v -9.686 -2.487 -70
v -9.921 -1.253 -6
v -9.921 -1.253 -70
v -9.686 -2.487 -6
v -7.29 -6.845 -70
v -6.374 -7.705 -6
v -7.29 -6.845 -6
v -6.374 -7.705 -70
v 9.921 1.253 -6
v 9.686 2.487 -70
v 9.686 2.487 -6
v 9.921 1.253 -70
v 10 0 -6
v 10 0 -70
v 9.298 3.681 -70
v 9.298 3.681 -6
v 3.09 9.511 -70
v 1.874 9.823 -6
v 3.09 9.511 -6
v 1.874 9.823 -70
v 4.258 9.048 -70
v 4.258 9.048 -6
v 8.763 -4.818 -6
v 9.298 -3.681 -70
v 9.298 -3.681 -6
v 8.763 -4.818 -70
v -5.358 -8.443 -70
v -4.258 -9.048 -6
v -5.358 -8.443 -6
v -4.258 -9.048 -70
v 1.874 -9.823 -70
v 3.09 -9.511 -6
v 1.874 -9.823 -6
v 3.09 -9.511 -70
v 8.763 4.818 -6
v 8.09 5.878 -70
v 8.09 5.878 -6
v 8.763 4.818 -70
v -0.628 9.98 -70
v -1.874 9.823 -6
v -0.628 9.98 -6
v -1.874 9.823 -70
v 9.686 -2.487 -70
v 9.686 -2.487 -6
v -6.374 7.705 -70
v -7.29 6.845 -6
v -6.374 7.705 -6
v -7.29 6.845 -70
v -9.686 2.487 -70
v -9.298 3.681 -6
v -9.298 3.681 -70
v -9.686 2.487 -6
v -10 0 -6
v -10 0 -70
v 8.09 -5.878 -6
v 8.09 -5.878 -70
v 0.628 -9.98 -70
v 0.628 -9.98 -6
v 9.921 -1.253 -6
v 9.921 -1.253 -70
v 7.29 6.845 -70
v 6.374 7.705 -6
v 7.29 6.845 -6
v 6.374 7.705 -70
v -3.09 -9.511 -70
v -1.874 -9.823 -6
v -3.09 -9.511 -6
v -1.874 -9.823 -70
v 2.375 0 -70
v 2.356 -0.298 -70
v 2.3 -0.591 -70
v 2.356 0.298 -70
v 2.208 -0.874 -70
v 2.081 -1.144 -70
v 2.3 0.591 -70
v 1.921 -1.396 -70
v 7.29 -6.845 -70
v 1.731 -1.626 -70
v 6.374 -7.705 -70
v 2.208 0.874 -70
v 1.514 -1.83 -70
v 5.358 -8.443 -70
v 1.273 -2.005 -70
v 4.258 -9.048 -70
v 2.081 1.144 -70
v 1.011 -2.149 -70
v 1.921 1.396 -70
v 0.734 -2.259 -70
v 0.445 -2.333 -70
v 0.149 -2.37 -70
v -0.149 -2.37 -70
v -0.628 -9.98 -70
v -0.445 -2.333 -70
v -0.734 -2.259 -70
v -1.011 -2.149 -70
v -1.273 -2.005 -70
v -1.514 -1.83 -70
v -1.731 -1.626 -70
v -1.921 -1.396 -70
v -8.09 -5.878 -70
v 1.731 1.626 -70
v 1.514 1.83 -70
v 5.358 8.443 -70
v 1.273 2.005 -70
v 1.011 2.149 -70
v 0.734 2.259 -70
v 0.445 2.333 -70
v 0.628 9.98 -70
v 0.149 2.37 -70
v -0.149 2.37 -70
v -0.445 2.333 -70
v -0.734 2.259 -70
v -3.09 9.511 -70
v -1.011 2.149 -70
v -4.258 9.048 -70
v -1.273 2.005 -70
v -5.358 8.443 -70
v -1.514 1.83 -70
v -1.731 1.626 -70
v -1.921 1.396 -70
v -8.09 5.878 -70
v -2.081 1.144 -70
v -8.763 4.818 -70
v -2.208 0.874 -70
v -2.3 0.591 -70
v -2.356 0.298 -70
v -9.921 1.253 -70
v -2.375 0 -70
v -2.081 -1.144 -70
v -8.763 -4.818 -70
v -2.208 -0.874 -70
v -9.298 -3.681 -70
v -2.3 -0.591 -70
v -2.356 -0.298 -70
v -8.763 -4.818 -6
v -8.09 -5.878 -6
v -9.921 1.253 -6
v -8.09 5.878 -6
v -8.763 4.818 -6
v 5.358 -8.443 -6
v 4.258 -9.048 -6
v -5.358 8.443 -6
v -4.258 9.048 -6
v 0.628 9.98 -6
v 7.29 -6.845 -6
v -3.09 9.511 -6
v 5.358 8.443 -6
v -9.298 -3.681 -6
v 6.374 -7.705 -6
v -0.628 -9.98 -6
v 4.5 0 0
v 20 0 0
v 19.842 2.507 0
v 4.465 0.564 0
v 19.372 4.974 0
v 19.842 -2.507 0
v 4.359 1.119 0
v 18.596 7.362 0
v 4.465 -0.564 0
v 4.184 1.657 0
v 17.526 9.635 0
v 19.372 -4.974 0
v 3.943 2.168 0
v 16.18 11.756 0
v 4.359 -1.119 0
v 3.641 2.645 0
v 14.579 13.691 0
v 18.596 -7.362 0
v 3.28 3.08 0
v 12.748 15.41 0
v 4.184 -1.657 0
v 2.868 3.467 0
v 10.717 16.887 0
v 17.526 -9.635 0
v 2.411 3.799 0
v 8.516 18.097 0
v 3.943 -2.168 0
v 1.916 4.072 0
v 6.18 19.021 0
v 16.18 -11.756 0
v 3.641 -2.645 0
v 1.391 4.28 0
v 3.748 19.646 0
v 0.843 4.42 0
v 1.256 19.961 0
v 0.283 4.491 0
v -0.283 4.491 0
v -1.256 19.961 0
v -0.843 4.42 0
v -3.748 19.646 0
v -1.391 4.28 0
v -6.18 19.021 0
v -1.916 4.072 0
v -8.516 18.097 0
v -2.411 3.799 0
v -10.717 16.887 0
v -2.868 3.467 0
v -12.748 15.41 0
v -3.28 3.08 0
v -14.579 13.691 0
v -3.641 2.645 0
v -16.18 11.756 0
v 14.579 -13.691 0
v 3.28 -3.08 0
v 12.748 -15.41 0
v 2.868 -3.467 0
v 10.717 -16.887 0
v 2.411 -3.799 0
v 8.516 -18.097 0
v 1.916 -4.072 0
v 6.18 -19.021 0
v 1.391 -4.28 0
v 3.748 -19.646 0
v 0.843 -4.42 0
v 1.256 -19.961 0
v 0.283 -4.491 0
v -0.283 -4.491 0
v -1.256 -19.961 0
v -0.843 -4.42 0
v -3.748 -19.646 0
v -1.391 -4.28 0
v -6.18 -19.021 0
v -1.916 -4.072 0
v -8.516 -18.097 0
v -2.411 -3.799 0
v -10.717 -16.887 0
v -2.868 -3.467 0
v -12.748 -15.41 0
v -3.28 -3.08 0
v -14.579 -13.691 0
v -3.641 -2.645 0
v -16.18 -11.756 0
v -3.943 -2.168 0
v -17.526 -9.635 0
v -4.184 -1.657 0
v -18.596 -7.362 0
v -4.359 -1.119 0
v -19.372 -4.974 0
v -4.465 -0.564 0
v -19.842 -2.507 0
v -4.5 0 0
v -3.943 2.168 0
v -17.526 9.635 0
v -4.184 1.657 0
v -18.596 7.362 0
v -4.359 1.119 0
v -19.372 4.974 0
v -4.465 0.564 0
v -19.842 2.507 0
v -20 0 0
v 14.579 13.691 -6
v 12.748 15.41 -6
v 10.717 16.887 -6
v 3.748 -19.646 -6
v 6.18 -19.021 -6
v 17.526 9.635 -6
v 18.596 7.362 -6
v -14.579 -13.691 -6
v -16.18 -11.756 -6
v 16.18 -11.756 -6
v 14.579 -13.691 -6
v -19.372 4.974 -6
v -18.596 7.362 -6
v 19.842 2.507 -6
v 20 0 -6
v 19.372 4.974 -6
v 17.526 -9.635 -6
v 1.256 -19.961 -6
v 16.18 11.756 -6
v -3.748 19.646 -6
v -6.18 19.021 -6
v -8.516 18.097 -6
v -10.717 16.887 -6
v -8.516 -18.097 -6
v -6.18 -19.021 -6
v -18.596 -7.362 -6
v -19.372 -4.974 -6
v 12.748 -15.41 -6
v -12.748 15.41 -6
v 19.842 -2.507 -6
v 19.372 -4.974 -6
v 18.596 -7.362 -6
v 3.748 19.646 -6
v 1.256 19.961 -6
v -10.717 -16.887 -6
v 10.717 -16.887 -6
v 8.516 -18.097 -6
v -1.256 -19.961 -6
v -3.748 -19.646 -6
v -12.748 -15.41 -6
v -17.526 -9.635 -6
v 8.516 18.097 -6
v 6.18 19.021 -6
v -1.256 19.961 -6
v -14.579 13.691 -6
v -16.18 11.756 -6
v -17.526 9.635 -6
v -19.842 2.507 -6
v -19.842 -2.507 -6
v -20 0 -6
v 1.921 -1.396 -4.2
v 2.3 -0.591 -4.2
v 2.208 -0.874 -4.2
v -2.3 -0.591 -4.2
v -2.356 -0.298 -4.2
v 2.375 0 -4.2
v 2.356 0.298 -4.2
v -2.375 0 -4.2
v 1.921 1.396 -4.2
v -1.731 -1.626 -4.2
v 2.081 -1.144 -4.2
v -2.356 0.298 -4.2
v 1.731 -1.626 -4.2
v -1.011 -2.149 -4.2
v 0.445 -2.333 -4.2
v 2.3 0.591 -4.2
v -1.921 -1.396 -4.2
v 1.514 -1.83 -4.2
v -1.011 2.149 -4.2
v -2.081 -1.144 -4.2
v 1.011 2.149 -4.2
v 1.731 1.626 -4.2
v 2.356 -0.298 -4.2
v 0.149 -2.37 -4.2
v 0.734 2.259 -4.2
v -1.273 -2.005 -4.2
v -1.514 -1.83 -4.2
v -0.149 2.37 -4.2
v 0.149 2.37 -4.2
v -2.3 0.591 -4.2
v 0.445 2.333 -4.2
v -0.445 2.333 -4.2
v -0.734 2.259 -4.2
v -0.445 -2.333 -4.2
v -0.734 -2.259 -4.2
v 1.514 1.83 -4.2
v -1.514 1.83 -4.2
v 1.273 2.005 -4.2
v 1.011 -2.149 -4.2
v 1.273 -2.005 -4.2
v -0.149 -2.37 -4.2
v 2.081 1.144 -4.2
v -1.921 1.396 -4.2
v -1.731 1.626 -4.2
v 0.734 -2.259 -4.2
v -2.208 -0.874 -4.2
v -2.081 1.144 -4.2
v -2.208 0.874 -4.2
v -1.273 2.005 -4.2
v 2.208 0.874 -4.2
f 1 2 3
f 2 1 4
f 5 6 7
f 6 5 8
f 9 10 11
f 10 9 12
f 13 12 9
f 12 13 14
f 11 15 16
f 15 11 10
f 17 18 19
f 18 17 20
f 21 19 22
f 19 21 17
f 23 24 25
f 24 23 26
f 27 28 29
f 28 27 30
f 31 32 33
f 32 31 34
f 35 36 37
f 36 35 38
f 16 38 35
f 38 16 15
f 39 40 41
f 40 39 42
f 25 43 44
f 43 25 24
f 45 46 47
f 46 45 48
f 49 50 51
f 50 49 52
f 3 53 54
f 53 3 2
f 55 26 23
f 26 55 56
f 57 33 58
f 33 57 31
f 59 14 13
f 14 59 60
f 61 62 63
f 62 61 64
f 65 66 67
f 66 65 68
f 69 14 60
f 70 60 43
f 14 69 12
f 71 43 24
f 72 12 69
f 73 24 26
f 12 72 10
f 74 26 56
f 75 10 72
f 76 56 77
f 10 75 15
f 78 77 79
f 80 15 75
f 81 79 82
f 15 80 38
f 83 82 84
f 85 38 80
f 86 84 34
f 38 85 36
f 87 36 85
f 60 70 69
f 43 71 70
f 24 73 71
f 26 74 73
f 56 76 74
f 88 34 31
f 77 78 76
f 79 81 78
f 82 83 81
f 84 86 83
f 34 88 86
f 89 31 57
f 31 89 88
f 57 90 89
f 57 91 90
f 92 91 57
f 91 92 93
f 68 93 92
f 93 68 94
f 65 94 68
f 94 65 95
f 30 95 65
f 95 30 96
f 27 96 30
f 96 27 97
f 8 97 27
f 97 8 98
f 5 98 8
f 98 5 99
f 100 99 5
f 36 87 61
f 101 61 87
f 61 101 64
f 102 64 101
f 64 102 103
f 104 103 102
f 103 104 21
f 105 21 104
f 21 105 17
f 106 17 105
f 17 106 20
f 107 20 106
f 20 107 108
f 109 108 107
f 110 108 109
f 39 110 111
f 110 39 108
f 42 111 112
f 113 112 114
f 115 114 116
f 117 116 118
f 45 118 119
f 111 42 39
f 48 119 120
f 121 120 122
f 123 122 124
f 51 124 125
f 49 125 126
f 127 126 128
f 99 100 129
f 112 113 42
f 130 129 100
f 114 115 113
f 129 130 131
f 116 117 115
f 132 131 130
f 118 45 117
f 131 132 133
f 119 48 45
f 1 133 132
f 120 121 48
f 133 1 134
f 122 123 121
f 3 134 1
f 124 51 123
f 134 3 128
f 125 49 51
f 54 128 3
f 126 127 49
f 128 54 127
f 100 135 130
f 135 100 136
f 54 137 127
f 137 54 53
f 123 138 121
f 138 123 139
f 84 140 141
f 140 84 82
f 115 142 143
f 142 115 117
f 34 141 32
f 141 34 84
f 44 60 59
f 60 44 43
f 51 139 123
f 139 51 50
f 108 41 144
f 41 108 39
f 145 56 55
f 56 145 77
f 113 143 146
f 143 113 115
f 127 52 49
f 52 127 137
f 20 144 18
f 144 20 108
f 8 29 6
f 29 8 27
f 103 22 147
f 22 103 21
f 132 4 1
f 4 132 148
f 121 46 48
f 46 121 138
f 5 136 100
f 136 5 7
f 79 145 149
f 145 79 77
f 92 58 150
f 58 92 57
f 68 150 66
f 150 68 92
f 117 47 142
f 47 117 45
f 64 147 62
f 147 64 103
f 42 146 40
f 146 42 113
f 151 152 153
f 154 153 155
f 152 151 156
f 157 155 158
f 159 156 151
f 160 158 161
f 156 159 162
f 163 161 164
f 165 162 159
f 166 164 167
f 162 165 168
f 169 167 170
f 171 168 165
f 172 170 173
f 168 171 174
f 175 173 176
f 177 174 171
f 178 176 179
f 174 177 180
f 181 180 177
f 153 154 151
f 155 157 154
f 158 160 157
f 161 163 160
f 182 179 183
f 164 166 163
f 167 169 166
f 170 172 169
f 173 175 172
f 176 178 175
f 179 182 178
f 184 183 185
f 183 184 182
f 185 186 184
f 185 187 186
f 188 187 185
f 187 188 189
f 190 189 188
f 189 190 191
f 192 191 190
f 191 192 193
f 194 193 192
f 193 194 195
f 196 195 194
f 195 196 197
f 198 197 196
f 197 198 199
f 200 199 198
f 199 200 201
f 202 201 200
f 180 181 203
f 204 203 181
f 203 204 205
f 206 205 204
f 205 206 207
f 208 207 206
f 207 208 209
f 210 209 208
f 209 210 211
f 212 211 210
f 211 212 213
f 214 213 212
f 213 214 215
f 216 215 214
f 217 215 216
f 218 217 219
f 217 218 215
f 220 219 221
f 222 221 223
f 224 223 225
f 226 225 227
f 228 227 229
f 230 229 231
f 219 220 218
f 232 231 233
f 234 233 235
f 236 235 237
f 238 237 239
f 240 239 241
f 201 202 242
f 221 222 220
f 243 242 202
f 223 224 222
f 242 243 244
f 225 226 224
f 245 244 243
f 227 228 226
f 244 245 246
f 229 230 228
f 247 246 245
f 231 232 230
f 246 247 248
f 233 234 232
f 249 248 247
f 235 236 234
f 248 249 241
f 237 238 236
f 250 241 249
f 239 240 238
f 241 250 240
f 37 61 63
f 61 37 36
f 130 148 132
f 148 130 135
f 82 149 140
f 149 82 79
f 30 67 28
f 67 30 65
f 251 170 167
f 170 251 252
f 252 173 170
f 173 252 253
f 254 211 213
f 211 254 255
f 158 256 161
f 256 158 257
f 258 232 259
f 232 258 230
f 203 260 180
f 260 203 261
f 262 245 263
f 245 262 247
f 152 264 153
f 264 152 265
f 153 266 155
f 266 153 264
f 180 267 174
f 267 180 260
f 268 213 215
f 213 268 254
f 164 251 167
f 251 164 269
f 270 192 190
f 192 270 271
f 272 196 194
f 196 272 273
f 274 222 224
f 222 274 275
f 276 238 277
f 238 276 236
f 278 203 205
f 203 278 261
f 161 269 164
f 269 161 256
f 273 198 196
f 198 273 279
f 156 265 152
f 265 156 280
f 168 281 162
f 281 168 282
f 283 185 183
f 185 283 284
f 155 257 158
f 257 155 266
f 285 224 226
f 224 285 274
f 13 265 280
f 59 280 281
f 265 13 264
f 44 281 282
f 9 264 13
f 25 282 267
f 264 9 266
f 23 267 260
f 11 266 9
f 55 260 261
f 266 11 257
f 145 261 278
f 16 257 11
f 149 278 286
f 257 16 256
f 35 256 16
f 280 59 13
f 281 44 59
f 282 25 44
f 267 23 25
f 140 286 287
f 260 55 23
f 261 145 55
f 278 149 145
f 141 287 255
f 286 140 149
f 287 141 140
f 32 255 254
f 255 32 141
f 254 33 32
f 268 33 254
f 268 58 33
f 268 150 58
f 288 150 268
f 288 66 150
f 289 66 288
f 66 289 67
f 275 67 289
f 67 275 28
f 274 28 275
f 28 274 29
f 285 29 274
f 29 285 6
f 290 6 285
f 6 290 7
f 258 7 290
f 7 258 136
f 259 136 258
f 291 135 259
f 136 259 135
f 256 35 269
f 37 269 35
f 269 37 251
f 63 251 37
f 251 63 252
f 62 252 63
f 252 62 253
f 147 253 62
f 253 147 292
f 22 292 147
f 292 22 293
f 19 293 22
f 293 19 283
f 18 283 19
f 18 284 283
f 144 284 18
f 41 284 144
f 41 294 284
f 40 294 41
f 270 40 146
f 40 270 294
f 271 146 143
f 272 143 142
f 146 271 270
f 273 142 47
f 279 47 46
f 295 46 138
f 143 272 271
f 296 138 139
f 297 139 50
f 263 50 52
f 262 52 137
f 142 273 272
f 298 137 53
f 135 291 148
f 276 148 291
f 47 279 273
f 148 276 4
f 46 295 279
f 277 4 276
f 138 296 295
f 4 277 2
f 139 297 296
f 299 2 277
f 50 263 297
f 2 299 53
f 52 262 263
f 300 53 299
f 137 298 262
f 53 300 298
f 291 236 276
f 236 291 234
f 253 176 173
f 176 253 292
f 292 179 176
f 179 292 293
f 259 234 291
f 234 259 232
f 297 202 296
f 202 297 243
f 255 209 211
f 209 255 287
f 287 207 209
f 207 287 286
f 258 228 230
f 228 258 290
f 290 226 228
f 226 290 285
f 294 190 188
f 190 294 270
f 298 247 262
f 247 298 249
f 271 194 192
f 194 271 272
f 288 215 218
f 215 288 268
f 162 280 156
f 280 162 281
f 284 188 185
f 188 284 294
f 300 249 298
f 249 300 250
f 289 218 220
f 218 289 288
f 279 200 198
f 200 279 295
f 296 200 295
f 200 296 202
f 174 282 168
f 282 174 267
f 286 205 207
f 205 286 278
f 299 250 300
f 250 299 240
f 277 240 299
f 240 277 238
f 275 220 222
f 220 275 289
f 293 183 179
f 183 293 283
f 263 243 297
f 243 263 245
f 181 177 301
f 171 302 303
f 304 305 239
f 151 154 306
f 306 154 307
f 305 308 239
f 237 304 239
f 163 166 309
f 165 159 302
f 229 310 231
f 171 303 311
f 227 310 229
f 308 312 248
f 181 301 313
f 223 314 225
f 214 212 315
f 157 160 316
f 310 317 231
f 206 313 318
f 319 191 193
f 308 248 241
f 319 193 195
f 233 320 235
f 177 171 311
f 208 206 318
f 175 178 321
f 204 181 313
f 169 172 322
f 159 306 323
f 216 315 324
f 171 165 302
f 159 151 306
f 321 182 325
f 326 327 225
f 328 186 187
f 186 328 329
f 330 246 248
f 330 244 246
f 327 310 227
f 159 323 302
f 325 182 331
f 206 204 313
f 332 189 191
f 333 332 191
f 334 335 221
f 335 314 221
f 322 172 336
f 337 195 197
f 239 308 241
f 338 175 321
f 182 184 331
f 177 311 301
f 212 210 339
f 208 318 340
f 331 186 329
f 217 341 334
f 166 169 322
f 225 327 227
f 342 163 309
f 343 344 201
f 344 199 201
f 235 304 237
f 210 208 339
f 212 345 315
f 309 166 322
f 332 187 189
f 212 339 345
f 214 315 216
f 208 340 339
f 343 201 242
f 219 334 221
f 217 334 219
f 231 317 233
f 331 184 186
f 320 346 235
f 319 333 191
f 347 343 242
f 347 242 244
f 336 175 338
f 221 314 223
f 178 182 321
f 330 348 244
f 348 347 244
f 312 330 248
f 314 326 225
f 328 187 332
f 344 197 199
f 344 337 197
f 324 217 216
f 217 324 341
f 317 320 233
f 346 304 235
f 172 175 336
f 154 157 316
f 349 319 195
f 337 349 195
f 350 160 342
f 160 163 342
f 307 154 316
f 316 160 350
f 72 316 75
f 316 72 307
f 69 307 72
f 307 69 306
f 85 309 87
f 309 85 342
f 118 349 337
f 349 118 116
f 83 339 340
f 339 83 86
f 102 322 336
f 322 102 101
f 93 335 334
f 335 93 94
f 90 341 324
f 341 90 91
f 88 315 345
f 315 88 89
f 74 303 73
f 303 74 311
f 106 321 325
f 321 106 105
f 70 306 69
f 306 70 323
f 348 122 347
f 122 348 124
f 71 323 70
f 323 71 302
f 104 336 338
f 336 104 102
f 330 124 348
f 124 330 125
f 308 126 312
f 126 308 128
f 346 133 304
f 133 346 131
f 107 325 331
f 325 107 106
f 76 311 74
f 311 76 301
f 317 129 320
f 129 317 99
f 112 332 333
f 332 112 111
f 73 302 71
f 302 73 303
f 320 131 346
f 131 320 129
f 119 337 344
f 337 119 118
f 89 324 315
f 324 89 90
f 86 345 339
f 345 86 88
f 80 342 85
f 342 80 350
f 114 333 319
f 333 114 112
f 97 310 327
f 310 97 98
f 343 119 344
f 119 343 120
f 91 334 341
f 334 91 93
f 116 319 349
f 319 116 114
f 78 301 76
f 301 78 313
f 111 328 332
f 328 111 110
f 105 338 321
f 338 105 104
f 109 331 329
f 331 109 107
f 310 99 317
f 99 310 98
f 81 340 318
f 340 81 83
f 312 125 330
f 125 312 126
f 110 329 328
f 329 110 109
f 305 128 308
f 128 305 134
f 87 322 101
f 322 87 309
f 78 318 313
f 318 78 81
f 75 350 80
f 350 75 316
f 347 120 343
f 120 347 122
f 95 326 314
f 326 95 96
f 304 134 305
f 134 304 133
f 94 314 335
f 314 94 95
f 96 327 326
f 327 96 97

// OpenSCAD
$fn = 50;


difference() {
	union() {
		translate(v = [0, 0, -70.0000000000]) {
			cylinder(h = 70, r = 10.0000000000);
		}
		translate(v = [0, 0, -6.0000000000]) {
			cylinder(h = 6, r = 20.0000000000);
		}
	}
	union() {
		translate(v = [0, 0, 0]) {
			rotate(a = [0, 0, 0]) {
				difference() {
					union() {
						#translate(v = [0, 0, -70.0000000000]) {
							cylinder(h = 70, r = 2.2500000000);
						}
						#translate(v = [0, 0, -4.2000000000]) {
							cylinder(h = 4.2000000000, r = 10.0000000000, r1 = 2.3750000000, r2 = 4.5000000000);
						}
						#translate(v = [0, 0, -70.0000000000]) {
							cylinder(h = 70, r = 2.3750000000);
						}
						#translate(v = [0, 0, -70.0000000000]) {
							cylinder(h = 70, r = 2.2500000000);
						}
					}
					union();
				}
			}
		}
	}
}
